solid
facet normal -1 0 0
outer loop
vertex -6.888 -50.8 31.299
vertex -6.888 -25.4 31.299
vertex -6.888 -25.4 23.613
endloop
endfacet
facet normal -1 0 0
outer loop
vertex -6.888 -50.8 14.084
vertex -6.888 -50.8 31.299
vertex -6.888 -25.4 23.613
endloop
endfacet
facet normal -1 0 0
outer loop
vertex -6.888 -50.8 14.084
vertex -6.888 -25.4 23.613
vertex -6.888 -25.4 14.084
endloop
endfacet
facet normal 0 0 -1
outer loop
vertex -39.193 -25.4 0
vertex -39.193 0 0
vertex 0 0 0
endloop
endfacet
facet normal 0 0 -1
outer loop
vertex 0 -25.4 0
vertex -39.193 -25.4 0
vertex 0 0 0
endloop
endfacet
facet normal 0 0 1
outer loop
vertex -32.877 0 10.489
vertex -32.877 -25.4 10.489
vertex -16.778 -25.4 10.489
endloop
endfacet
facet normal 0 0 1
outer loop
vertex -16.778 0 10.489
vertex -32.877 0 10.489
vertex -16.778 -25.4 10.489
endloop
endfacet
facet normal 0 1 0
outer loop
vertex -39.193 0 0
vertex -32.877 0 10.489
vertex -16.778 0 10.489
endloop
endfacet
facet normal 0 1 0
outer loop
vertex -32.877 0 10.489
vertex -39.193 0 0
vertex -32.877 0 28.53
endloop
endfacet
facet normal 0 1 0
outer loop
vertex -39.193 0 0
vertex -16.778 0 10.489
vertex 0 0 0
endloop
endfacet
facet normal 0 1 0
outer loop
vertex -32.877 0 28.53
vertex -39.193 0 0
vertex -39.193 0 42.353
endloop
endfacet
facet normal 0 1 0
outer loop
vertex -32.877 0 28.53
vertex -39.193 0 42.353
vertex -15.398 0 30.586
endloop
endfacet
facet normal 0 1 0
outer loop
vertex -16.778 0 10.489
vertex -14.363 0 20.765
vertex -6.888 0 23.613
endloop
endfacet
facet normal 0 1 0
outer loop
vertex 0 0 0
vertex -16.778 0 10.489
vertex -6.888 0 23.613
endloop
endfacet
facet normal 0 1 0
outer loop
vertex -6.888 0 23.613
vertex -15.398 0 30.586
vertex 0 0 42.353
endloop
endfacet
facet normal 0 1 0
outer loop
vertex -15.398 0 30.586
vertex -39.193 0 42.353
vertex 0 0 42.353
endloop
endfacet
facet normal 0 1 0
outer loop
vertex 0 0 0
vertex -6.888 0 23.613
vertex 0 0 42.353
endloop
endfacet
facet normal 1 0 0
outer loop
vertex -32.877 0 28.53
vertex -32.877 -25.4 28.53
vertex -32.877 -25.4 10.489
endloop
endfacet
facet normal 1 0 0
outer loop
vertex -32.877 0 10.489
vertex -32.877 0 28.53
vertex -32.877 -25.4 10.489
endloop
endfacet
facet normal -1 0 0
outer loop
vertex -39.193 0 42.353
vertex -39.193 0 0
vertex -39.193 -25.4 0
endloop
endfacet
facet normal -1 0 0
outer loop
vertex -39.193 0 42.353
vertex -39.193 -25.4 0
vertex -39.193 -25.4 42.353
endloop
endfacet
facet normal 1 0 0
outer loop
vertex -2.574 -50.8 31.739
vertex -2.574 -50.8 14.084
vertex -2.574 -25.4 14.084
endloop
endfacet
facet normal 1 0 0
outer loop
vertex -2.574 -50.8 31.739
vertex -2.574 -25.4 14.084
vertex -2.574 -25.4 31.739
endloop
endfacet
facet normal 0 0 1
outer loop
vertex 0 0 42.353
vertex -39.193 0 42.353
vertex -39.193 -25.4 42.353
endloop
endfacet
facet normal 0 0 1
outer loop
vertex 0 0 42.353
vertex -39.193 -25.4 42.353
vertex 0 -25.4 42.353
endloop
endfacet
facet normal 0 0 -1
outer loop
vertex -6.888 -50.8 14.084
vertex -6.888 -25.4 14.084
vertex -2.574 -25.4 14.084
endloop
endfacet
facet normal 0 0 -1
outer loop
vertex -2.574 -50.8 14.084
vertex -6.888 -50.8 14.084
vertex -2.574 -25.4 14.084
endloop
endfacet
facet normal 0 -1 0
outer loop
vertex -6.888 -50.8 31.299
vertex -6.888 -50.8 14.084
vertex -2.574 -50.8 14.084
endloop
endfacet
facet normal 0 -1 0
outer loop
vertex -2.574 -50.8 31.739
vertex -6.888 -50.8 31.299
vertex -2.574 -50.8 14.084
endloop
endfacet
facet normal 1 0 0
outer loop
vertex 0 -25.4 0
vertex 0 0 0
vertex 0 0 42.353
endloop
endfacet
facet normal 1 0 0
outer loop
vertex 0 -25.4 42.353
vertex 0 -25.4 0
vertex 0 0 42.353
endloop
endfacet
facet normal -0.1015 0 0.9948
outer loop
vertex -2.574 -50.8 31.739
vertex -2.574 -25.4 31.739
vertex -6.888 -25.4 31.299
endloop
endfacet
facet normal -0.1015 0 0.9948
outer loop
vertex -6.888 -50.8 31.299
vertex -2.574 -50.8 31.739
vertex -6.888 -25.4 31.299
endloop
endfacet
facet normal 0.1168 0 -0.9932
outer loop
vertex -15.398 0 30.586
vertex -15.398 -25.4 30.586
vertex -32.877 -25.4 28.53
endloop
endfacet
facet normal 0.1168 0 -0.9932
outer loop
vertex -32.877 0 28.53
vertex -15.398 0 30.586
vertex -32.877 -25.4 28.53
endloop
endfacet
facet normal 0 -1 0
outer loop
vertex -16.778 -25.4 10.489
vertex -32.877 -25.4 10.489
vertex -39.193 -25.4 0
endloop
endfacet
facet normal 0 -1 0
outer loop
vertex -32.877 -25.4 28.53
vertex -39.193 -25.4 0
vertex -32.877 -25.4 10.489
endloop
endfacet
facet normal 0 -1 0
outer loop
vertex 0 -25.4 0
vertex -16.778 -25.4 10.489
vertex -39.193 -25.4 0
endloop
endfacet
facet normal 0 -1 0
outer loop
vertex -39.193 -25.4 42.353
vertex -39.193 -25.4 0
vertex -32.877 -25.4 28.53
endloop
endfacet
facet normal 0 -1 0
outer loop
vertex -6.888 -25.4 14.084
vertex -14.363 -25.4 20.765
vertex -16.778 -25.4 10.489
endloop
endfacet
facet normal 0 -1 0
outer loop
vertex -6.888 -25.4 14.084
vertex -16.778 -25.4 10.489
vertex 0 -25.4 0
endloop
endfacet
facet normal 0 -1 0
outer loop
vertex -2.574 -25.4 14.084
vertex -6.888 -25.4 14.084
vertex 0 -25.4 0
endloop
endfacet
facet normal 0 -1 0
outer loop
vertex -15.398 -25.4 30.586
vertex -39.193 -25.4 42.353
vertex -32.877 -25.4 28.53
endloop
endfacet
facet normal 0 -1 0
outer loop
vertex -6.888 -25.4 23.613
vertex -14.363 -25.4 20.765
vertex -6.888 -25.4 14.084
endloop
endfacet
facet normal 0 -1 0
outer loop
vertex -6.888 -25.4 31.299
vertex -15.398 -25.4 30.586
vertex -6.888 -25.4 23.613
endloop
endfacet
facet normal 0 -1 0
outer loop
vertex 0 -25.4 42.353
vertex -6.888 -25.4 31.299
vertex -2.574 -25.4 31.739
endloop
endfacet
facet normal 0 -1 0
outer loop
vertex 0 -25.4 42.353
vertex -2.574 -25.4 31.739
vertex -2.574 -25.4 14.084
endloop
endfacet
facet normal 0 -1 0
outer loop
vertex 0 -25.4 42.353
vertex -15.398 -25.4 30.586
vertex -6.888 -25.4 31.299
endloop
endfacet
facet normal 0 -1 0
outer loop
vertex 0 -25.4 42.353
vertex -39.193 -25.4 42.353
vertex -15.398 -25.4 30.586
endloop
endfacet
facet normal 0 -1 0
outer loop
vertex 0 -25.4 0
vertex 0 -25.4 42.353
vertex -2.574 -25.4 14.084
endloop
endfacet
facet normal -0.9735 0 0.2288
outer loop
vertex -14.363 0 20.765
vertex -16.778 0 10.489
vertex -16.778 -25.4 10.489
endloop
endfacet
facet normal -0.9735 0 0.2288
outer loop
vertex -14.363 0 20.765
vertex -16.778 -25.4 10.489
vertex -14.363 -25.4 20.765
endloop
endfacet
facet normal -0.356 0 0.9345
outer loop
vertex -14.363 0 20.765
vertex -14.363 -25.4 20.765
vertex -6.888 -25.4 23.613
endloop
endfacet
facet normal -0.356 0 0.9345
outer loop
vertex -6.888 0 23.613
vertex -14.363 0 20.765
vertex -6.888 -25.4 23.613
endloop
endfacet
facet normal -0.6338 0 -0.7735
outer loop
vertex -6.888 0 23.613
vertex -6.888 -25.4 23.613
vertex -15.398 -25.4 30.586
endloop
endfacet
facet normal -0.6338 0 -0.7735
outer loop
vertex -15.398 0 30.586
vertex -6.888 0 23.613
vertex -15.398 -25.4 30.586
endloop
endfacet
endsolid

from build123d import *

# Parameters (mm, degrees)
F0_W     = 39.1931459308
F0_H     = 42.3528775573
F1_DEPTH = 25.4
F3_DEPTH = 25.4
F5_DEPTH = 25.4


# Not quite as in the source:
# - ends of sketch curves that miss each other by under 0.0002 mm in the source are joined
# - a feature of the source that left no trace in its solid (it failed there, or was rolled back) is left out


with BuildPart() as f1:
    # F0 (on Front) → F1 (new body)
    with BuildSketch(Plane.XZ):
        with Locations((-19.5965729654, 21.1764387786)):
            Rectangle(F0_W, F0_H)
    extrude(amount=F1_DEPTH)

    # F2 (on face) → F3 (cut)
    with BuildSketch(Plane.XZ.offset(25.4)):
        Polygon((-6.8881497718, 23.612594232), (-15.3977563605, 30.5856615305), (-32.8769646585, 28.529709205), (-32.8769646585, 10.48855111), (-16.7776942253, 10.48855111), (-14.3628085498, 20.764878951), align=None)
        Polygon((-21.8374673277, 17.9171636701), (-14.3628085498, 20.764878951), (-20.9175087512, 15.6267150305), align=None, mode=Mode.SUBTRACT)
        Polygon((-20.9175087512, 15.6267150305), (-14.3628085498, 20.764878951), (-21.8374673277, 17.9171636701), align=None)
    extrude(amount=-F3_DEPTH, mode=Mode.SUBTRACT)

    # F4 (on face) → F5 (join)
    with BuildSketch(Plane.XZ.offset(25.4)):
        Polygon((-6.8881497718, 31.2989987433), (-6.8881497718, 23.612594232), (-6.8881497718, 14.083658345), (-2.5741870049, 14.083658345), (-2.5741870049, 31.7389145494), align=None)
    extrude(amount=F5_DEPTH)


solid = f1.part
